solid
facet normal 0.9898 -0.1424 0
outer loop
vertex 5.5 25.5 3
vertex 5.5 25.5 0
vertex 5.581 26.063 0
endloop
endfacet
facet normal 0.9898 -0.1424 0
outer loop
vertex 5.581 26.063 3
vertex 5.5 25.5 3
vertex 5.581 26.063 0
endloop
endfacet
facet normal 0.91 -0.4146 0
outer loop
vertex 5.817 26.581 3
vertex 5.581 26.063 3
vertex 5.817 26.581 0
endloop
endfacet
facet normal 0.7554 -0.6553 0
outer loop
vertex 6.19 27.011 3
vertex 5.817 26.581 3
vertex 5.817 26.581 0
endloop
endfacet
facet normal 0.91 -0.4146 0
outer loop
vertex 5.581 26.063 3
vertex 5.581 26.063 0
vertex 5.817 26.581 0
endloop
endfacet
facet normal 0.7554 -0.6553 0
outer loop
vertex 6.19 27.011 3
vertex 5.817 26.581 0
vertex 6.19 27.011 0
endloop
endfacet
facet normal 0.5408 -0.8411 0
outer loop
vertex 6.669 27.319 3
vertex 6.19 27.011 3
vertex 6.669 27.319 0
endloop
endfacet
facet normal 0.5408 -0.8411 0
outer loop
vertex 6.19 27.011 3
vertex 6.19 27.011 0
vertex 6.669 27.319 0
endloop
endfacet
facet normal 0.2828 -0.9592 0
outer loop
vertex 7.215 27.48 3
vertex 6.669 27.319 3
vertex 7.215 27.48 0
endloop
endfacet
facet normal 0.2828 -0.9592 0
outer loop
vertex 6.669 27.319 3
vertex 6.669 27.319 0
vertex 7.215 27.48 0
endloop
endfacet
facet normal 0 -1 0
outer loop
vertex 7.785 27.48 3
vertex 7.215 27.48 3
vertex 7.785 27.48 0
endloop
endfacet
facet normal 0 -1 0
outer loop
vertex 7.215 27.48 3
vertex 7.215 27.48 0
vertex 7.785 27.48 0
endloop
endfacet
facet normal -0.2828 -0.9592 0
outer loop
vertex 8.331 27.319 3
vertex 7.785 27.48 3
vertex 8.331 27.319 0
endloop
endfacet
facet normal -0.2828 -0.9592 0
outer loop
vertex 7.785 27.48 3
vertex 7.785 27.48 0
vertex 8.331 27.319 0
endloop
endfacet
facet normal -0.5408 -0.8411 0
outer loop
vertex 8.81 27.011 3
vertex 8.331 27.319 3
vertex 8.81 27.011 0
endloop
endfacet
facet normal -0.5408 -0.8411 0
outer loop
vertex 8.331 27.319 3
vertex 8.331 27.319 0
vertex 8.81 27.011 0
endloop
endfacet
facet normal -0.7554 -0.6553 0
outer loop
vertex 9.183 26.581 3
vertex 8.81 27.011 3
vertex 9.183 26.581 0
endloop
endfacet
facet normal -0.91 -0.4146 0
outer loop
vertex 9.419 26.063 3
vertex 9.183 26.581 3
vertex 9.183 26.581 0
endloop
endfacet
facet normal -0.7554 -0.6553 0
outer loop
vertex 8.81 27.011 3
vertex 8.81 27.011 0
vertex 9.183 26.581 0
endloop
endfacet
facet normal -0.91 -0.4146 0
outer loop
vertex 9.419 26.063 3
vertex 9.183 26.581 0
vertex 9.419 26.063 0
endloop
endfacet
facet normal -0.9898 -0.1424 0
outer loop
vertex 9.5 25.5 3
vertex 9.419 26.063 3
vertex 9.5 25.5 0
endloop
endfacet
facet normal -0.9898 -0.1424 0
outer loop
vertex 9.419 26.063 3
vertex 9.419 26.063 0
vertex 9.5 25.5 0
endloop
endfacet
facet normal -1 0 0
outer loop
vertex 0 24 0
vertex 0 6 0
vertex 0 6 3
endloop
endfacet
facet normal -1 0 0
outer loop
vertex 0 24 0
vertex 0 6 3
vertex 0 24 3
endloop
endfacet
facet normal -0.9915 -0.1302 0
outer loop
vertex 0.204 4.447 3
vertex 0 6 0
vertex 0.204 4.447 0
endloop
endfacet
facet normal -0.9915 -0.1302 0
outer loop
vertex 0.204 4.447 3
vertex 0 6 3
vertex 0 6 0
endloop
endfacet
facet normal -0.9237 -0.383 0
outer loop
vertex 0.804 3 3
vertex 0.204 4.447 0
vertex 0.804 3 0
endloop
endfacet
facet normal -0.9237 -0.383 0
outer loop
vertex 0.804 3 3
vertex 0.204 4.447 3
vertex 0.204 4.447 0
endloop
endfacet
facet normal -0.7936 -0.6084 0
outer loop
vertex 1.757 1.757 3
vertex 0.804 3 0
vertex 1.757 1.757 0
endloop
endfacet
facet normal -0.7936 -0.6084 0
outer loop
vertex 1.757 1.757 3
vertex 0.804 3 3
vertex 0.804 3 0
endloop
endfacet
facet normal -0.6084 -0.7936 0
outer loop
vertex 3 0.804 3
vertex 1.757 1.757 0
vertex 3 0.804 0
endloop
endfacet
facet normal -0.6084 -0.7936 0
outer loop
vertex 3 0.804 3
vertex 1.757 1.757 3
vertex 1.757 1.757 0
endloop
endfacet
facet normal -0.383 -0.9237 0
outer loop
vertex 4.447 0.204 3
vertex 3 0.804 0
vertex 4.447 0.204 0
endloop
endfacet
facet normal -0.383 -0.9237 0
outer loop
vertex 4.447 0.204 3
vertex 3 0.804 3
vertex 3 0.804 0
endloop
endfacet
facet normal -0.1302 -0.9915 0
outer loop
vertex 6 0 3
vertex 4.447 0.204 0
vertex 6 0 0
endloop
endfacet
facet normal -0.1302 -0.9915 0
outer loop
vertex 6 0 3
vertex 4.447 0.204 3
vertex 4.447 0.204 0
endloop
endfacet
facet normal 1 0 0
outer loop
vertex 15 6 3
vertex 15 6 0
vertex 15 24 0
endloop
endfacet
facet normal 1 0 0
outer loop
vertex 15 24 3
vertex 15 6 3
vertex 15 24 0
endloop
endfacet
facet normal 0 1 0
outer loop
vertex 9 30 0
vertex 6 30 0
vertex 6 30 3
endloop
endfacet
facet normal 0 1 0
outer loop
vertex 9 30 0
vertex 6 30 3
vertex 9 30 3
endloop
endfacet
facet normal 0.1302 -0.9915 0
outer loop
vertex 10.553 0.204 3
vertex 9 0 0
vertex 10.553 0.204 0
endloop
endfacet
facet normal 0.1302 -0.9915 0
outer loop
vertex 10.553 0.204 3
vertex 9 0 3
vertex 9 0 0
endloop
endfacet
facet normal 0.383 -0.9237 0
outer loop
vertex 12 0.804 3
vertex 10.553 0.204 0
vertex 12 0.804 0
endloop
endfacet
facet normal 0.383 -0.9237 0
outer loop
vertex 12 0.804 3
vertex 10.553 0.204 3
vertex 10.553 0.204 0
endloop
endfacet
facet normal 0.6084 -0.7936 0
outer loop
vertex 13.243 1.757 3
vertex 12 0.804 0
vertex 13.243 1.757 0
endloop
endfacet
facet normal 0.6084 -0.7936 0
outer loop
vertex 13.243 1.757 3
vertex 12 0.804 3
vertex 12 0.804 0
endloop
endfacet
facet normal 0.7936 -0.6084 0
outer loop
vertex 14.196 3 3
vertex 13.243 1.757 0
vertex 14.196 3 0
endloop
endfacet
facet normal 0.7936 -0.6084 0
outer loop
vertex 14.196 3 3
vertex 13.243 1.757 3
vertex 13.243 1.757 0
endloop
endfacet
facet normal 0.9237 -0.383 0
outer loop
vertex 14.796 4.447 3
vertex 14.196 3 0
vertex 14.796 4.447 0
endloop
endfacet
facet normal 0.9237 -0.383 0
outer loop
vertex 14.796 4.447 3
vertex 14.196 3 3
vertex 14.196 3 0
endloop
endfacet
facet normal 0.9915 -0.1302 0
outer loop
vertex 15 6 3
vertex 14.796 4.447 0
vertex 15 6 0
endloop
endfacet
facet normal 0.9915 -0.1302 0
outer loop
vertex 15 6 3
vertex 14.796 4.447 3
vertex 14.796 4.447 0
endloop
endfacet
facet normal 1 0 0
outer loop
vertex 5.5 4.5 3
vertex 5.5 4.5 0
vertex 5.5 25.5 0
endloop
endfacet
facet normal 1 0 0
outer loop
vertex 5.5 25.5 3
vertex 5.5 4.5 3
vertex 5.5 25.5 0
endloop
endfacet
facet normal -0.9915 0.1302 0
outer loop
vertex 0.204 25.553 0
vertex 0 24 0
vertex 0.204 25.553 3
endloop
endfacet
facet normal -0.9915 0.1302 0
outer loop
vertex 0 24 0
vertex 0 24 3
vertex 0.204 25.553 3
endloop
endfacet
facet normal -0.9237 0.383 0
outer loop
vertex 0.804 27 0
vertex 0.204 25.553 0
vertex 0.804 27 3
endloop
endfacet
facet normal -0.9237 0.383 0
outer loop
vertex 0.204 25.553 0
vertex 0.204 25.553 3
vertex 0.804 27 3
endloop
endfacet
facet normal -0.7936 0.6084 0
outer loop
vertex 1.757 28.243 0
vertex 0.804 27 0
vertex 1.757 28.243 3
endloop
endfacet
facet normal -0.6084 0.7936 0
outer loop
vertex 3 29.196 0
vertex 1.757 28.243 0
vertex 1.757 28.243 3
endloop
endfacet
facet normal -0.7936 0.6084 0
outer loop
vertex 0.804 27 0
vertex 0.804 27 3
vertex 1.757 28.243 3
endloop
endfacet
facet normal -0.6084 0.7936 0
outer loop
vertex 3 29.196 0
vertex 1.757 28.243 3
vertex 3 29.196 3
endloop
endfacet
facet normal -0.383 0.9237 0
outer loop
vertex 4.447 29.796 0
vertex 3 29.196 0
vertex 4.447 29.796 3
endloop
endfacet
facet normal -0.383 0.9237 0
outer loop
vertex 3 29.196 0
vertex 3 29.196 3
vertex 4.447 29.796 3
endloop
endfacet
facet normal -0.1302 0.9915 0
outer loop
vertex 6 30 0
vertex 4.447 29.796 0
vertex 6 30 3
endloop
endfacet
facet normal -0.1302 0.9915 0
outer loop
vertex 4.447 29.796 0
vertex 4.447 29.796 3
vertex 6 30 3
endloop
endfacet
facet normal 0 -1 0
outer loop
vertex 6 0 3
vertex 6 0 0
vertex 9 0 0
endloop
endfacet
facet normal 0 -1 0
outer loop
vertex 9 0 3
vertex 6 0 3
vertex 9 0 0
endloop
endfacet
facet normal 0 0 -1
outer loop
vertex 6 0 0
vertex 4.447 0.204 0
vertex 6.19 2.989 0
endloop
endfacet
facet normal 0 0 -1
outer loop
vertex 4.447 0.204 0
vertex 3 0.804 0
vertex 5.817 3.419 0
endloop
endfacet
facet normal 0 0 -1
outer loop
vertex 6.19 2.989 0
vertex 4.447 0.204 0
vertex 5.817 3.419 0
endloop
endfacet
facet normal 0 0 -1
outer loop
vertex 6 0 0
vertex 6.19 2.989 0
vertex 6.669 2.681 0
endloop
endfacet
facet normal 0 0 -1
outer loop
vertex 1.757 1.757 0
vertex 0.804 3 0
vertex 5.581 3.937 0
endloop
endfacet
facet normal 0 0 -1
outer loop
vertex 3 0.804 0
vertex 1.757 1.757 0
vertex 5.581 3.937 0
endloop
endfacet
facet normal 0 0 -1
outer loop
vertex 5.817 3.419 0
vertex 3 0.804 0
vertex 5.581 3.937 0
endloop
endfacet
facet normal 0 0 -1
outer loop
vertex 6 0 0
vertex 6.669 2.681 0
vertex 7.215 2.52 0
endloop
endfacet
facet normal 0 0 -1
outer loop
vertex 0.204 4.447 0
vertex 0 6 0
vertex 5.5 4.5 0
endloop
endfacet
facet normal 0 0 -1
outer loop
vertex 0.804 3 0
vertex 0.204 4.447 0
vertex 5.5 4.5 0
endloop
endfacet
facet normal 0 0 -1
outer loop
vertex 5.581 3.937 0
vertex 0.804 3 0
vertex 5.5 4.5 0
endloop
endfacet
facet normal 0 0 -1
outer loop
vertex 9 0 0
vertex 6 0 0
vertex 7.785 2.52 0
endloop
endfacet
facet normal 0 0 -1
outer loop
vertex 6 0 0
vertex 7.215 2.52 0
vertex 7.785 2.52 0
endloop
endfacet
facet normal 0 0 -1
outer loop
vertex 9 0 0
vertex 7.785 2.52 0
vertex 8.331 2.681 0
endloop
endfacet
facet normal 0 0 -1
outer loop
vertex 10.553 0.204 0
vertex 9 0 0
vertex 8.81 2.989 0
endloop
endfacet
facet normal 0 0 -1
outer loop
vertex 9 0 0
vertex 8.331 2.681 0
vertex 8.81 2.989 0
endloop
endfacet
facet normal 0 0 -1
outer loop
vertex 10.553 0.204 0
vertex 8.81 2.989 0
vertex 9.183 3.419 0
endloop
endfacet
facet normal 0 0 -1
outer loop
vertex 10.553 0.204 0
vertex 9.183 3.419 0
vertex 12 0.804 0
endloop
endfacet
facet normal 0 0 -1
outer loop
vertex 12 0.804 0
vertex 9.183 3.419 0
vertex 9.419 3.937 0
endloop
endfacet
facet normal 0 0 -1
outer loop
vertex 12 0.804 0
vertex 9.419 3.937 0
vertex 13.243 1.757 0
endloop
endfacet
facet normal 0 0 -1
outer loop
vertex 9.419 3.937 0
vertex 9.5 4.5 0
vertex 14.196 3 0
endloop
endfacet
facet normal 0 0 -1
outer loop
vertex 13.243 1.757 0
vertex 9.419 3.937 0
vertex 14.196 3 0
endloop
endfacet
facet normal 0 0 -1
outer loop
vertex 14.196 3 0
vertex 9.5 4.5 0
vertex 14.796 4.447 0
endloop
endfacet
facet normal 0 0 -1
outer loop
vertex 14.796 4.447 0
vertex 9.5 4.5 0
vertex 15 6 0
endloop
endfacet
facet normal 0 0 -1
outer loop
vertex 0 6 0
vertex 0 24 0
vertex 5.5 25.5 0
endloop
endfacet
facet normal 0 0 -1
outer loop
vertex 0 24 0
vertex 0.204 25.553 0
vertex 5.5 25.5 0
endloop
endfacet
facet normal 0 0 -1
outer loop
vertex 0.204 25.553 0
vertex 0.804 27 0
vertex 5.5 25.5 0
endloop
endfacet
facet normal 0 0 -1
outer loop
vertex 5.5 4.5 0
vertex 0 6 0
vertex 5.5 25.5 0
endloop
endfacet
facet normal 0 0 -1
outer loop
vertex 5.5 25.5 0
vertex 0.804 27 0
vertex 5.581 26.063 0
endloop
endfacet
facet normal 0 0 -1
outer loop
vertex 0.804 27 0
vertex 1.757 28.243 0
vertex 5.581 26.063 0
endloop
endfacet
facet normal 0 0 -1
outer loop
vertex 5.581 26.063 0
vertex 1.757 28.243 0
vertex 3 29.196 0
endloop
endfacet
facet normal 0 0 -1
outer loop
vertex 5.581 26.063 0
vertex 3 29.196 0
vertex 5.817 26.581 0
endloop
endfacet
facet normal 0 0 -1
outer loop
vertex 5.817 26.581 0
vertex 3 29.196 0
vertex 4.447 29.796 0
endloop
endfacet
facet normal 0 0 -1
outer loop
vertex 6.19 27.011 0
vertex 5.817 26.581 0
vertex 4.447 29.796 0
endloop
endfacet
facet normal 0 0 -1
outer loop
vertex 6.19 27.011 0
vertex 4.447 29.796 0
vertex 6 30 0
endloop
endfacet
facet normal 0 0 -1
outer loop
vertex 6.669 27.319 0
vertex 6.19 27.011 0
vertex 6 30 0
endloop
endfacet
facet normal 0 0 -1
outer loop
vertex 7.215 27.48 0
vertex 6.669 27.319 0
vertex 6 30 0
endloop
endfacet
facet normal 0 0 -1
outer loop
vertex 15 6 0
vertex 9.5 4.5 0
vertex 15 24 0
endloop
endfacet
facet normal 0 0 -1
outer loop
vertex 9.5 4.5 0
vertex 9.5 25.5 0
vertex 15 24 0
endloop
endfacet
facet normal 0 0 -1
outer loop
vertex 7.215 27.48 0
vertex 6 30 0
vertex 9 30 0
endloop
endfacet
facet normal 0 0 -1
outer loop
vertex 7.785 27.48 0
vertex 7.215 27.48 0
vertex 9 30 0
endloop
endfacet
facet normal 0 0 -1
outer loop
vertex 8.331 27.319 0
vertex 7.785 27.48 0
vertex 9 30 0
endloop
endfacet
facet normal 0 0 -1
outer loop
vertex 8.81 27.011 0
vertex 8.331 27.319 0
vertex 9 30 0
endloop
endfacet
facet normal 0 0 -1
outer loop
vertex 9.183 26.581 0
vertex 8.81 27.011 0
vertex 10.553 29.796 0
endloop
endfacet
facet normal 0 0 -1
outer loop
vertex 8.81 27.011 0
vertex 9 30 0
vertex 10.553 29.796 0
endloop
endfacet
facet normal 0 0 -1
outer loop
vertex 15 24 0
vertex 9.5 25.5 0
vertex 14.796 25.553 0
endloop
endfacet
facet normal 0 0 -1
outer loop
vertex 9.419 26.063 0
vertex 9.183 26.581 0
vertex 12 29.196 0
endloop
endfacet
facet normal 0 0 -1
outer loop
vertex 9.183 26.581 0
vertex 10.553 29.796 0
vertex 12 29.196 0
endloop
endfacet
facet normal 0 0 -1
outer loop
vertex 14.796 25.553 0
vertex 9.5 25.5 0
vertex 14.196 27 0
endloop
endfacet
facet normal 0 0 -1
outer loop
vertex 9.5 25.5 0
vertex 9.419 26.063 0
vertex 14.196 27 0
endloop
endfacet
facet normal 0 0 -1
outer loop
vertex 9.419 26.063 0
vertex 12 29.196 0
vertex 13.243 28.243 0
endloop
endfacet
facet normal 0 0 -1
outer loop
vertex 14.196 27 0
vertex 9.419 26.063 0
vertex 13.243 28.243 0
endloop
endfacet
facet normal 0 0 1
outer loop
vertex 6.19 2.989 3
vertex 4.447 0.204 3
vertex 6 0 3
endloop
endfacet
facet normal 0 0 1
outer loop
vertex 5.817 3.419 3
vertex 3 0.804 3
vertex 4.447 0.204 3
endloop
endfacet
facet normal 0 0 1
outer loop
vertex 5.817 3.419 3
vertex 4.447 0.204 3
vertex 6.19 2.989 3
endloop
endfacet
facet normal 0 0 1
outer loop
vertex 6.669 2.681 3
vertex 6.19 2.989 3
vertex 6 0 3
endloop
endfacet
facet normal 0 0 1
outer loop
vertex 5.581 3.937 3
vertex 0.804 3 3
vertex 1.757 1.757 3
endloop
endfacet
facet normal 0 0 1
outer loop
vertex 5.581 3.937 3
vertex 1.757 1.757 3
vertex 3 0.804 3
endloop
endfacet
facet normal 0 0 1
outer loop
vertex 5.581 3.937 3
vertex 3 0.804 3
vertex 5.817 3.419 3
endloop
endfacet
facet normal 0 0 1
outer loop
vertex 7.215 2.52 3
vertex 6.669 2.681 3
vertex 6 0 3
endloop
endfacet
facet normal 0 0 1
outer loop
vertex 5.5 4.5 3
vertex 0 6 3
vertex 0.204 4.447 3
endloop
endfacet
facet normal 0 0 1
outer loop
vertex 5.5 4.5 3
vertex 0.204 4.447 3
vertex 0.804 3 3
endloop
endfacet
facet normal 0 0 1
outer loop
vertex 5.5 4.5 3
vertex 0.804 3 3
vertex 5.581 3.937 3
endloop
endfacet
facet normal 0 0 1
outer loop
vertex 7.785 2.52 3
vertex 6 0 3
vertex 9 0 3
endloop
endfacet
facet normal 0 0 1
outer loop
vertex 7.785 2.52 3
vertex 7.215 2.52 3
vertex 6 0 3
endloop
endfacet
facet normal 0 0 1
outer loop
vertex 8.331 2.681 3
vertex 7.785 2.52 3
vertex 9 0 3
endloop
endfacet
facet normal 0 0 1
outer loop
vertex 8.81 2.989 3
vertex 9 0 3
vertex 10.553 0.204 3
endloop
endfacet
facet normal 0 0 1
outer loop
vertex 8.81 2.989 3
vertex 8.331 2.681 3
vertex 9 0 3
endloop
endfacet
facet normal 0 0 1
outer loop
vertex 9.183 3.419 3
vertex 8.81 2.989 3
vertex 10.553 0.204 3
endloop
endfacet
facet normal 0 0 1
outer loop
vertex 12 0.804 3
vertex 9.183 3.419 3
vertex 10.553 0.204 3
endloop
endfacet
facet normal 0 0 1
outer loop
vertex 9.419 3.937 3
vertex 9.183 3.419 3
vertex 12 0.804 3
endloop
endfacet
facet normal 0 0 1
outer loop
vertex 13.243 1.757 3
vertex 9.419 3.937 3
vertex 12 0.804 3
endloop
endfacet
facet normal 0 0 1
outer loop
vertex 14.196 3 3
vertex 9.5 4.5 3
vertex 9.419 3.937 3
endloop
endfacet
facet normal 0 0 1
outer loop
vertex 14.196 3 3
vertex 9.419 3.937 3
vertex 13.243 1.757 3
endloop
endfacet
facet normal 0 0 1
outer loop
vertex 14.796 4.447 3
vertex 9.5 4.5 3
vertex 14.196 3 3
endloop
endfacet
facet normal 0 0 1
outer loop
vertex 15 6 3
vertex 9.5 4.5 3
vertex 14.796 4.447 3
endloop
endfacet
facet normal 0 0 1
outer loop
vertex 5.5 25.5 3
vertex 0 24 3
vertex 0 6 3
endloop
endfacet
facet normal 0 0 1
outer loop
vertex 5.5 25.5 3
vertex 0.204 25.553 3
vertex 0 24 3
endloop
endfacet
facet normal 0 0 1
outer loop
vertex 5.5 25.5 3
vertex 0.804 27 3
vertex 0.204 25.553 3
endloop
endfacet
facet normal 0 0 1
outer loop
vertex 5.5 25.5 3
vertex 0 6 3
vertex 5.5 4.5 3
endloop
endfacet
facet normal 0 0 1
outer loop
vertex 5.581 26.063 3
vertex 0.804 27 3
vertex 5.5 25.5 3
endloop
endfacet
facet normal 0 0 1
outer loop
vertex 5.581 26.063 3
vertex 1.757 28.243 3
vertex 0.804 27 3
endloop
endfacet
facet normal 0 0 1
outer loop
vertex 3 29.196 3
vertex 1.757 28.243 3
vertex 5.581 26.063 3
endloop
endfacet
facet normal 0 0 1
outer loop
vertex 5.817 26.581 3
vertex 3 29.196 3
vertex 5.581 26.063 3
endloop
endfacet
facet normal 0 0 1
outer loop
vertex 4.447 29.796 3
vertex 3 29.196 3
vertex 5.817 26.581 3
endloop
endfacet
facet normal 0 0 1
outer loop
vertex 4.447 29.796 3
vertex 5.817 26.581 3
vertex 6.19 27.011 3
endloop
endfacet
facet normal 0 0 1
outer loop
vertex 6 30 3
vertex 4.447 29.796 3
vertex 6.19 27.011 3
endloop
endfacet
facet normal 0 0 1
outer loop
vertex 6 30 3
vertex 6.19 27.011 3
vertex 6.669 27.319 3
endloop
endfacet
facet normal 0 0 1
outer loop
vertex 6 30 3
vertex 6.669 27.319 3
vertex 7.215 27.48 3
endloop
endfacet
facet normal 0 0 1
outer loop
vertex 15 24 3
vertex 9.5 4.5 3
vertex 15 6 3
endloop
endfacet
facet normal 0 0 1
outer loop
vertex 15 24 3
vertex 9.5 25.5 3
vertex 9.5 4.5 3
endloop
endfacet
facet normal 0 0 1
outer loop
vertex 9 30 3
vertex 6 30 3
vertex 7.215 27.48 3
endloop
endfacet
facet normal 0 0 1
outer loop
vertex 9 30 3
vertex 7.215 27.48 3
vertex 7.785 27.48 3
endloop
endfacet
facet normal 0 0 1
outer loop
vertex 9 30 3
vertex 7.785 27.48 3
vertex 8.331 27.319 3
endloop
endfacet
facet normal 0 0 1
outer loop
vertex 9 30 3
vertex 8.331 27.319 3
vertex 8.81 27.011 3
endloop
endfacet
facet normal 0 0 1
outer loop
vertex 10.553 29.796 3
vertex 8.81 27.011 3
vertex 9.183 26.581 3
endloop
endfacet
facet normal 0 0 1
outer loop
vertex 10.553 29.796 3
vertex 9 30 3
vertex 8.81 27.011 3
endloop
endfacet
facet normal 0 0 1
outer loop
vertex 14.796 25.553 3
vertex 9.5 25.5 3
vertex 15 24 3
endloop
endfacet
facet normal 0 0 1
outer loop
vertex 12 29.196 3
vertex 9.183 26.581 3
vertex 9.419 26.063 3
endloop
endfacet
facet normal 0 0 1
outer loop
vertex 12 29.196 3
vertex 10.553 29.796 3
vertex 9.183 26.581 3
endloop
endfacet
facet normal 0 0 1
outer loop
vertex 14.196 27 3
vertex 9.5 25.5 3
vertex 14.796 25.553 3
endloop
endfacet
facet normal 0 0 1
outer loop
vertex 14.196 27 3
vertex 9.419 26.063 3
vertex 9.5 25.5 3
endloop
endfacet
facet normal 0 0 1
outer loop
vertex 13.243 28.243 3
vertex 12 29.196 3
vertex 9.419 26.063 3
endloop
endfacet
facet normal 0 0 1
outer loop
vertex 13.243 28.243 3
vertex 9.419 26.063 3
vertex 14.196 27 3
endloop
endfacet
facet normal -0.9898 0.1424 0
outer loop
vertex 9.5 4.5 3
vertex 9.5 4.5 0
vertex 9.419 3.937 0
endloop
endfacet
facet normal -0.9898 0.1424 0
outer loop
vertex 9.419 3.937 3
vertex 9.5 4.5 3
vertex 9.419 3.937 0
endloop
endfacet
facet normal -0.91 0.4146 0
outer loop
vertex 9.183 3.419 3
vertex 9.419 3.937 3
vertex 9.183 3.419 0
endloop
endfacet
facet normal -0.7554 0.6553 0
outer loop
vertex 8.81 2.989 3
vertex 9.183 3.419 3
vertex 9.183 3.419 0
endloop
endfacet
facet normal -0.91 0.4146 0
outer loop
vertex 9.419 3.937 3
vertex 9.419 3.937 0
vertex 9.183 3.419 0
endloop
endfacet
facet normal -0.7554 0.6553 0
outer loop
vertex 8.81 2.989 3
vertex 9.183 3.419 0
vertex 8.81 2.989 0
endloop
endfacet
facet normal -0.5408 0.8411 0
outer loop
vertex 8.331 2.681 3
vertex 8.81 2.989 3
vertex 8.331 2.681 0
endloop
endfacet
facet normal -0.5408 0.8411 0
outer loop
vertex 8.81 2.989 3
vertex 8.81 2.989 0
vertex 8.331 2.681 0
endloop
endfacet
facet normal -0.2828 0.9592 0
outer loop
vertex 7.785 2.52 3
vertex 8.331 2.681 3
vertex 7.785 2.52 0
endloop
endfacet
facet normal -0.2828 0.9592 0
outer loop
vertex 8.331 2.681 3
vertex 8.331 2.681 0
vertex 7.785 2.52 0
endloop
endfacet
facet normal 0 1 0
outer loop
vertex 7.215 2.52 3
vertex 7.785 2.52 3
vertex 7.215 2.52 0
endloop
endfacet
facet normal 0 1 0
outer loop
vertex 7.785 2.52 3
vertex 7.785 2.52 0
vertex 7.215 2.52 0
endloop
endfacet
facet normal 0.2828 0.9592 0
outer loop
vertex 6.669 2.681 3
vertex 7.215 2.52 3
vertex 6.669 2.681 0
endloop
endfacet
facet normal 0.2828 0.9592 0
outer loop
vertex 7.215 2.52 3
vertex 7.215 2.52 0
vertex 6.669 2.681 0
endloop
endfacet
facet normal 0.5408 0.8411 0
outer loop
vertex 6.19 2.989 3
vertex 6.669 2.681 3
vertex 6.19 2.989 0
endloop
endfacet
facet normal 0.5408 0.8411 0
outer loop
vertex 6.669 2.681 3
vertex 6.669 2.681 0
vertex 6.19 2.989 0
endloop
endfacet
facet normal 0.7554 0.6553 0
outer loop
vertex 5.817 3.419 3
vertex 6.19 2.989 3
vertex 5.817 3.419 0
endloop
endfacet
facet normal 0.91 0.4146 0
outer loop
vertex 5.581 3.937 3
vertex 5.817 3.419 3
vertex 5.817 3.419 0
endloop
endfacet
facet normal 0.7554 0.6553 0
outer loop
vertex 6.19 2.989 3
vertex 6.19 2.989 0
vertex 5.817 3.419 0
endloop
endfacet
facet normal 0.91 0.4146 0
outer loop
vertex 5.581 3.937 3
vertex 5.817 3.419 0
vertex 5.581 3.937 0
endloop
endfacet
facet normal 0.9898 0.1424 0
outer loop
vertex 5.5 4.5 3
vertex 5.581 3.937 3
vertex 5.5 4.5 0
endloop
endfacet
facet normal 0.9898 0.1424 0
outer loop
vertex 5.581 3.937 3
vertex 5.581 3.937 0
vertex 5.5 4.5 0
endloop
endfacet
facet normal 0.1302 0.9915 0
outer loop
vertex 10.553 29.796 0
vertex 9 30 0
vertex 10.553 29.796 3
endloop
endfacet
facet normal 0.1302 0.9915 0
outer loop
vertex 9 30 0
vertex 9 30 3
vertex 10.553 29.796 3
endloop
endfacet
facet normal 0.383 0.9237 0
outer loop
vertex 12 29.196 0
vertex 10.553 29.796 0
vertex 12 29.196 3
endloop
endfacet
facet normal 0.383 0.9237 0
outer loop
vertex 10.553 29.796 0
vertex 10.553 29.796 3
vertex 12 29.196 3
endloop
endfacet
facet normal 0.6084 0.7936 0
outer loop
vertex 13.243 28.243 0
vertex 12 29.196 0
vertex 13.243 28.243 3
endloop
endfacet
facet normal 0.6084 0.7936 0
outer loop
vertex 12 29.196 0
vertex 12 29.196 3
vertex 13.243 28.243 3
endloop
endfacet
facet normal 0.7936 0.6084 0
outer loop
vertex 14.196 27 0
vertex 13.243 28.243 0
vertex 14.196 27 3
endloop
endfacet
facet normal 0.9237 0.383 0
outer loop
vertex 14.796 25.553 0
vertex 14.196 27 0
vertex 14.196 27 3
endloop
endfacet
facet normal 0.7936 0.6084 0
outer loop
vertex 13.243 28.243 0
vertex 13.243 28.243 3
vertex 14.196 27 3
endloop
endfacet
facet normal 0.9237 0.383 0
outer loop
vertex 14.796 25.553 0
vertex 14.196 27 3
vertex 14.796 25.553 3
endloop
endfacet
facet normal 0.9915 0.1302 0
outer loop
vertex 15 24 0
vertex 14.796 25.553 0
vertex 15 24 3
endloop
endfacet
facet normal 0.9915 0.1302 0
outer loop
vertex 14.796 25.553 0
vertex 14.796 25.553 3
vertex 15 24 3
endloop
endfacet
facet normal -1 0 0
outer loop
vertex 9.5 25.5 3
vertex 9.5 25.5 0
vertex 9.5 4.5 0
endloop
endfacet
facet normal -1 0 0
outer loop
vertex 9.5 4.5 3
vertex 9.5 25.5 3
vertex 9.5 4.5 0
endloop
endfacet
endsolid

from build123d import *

# Parameters (mm, degrees)
F0_W     = 15
F0_H     = 30
F1_DEPTH = 3
F2_R     = 6


with BuildPart() as f1:
    # F0 (on Top) → F1 (new body)
    with BuildSketch(Plane.XY):
        with Locations((7.5, 15)):
            Rectangle(F0_W, F0_H)
        with BuildLine():
            ThreePointArc((5.5, 25.5), (7.5, 27.5), (9.5, 25.5))
            Line((9.5, 25.5), (9.5, 4.5))
            ThreePointArc((9.5, 4.5), (7.5, 2.5), (5.5, 4.5))
            Line((5.5, 4.5), (5.5, 25.5))
        make_face(mode=Mode.SUBTRACT)
    extrude(amount=F1_DEPTH)

    # F2
    f2_edges = [f1.edges().sort_by_distance(p)[0] for p in [
        (15, 0, 1.5),
        (0, 0, 1.5),
        (15, 30, 1.5),
        (0, 30, 1.5),
    ]]
    fillet(f2_edges, radius=F2_R)


solid = f1.part
